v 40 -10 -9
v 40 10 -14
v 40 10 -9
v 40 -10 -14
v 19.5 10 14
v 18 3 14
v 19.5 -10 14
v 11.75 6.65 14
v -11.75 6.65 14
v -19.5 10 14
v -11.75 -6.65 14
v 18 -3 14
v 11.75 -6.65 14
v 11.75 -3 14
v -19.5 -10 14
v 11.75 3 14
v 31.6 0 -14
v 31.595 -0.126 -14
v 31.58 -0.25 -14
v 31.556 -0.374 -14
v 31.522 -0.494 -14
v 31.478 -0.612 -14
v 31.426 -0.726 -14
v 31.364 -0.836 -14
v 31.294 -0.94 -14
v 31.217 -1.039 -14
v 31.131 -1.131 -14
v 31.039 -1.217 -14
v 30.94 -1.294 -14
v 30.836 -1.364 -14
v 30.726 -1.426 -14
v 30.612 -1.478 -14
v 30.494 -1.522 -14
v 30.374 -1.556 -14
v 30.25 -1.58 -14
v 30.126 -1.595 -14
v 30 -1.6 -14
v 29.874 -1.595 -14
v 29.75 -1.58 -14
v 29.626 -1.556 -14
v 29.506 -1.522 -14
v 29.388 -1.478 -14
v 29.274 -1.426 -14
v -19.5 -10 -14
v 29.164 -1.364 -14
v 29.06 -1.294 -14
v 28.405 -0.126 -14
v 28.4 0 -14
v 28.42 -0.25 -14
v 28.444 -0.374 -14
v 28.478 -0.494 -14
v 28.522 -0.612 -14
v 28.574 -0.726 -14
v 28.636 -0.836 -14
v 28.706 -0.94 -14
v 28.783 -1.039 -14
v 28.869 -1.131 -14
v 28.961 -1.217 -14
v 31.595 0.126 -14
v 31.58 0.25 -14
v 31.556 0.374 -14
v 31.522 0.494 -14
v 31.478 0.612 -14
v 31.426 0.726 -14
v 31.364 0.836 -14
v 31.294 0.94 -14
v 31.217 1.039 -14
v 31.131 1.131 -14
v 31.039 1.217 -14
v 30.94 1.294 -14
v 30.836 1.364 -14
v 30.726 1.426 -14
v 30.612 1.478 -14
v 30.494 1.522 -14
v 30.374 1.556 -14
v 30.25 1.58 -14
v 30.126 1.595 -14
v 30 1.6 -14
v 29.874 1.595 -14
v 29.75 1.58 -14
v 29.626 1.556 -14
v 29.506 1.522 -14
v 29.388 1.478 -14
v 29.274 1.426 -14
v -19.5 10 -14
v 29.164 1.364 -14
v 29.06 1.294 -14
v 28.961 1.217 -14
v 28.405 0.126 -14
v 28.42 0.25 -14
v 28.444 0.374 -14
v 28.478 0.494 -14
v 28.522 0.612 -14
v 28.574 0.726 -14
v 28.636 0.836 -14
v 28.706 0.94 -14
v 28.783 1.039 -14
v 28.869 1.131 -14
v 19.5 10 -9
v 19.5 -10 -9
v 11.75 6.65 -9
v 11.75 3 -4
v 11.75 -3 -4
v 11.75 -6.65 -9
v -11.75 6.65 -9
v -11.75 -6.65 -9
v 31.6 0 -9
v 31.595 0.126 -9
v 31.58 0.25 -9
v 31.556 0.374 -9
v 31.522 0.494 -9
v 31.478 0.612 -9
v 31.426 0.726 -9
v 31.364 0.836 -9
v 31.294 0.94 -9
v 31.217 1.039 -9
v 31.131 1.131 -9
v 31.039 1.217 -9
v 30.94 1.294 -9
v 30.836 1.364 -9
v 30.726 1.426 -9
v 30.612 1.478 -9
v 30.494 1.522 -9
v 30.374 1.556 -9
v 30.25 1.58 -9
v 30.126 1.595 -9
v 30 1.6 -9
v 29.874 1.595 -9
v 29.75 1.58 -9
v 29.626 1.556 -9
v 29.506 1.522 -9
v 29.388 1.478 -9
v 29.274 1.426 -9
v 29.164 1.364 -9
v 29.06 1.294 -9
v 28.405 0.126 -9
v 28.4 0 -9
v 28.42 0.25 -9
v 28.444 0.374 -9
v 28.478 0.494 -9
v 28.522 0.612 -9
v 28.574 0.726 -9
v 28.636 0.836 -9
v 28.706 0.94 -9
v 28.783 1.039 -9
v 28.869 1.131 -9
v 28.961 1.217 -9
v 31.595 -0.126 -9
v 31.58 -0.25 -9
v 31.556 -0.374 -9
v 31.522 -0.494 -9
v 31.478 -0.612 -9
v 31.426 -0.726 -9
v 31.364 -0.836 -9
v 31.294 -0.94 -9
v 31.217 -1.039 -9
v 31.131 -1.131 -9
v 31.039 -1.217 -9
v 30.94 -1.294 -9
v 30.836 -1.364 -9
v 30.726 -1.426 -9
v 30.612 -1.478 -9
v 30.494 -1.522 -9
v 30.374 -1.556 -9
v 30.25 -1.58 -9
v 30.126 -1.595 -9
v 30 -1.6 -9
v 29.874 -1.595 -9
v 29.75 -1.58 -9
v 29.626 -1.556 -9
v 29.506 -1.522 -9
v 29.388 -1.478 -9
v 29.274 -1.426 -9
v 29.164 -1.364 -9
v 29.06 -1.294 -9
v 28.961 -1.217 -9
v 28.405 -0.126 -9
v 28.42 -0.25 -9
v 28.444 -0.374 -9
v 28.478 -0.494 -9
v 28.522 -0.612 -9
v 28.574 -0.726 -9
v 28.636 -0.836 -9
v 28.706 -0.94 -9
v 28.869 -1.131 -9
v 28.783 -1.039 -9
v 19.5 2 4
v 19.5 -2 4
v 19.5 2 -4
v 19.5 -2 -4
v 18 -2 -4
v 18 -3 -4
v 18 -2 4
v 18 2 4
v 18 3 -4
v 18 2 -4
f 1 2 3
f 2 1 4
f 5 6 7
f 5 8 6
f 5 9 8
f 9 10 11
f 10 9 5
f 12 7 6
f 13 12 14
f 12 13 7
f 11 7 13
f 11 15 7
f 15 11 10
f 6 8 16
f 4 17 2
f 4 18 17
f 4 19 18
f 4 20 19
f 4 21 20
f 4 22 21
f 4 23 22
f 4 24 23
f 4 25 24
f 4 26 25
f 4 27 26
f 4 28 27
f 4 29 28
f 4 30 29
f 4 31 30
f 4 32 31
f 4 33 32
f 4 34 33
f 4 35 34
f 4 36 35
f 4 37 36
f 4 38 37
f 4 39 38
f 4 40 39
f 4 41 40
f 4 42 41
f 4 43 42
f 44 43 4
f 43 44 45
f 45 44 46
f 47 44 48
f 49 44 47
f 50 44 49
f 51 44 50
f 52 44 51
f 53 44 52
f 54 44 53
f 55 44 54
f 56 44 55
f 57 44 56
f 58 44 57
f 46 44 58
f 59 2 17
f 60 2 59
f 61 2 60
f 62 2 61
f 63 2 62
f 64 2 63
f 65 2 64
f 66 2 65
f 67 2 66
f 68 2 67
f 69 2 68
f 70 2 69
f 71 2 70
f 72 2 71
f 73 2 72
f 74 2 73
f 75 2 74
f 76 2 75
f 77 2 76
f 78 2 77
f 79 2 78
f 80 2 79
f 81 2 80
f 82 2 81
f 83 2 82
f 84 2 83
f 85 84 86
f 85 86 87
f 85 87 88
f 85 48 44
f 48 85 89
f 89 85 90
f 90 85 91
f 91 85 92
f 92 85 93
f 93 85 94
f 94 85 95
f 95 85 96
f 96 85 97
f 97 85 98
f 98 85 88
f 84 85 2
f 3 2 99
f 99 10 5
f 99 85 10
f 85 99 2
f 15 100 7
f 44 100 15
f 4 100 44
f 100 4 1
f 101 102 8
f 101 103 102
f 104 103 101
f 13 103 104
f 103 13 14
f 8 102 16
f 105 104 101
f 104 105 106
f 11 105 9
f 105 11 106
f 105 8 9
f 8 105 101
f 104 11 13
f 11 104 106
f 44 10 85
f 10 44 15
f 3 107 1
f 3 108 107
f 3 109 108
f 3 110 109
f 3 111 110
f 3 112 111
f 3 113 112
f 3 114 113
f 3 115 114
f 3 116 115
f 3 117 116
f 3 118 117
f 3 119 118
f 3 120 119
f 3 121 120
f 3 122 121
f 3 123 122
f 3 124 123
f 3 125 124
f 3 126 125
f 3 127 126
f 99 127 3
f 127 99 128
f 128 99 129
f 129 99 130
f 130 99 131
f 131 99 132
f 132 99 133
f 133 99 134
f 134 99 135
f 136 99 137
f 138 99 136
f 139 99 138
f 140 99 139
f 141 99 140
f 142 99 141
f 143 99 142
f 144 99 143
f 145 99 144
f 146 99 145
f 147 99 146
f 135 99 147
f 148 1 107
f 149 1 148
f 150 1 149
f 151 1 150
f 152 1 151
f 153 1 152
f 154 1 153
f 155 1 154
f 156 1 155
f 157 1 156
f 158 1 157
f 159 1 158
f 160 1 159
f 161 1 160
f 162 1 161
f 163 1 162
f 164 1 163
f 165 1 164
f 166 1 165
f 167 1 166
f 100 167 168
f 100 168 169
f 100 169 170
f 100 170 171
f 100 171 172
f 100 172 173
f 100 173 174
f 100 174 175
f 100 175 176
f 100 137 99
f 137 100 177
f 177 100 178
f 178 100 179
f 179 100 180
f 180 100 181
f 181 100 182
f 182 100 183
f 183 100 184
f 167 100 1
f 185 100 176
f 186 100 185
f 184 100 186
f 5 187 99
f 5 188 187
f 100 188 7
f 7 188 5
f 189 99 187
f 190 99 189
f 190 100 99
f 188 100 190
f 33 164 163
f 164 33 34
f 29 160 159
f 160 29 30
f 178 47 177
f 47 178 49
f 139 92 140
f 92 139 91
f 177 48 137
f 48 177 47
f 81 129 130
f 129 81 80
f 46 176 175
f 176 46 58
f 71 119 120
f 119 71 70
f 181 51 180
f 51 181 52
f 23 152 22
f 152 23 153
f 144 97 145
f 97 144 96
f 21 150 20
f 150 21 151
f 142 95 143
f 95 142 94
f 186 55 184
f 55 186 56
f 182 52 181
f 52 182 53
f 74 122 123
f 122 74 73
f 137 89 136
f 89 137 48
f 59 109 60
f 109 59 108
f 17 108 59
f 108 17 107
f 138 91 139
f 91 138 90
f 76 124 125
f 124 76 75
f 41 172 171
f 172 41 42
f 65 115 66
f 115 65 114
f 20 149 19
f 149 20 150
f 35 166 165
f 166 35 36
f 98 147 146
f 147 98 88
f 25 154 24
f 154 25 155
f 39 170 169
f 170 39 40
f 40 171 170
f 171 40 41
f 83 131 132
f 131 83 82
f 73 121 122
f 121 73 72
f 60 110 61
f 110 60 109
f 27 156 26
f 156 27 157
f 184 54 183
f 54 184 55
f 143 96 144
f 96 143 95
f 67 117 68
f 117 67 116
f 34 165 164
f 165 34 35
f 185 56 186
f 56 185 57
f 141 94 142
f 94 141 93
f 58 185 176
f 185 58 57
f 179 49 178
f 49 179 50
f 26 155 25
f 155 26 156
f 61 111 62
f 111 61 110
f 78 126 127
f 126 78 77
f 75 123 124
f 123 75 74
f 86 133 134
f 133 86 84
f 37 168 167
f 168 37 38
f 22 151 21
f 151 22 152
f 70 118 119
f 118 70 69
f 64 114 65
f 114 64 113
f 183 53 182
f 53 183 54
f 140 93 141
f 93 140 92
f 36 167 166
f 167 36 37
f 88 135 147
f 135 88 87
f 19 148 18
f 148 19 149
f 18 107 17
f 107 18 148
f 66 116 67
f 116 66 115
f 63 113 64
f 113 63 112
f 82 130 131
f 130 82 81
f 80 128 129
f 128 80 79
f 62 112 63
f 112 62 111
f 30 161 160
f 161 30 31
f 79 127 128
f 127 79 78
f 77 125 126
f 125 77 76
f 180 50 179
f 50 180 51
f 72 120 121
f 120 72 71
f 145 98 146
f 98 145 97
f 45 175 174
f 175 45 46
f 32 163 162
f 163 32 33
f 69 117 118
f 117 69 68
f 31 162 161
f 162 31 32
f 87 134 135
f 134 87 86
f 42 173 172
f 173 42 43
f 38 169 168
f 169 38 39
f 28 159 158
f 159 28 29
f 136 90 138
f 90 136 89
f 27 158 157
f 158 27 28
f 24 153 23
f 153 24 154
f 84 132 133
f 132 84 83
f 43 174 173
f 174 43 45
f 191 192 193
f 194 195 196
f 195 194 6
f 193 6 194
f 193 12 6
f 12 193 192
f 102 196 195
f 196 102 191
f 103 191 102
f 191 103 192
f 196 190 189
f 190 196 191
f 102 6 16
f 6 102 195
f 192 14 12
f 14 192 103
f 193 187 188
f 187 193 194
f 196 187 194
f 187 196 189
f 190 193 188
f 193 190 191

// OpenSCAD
difference () {

union() {
    cube([80,20,28], center=true);
    cube([40,20,24], center=true);
    
}

    translate([0,0,3]) cube([23.5,13.30,24], center=true);
    translate([-30,0,0]) cube([21,24,30], center=true);
    translate([30,0,3]) cube([21,24,24], center=true);
    translate([-30,0,-12]) cylinder(r=1.6, h=8, center=true, $fn=80);
    translate([30,0,-12]) cylinder(r=1.6, h=8, center=true, $fn=80);

    translate([14,0,6]) cube([8,6,20], center=true);
    translate([18,0,0]) cube([8,4,8], center=true);

}
